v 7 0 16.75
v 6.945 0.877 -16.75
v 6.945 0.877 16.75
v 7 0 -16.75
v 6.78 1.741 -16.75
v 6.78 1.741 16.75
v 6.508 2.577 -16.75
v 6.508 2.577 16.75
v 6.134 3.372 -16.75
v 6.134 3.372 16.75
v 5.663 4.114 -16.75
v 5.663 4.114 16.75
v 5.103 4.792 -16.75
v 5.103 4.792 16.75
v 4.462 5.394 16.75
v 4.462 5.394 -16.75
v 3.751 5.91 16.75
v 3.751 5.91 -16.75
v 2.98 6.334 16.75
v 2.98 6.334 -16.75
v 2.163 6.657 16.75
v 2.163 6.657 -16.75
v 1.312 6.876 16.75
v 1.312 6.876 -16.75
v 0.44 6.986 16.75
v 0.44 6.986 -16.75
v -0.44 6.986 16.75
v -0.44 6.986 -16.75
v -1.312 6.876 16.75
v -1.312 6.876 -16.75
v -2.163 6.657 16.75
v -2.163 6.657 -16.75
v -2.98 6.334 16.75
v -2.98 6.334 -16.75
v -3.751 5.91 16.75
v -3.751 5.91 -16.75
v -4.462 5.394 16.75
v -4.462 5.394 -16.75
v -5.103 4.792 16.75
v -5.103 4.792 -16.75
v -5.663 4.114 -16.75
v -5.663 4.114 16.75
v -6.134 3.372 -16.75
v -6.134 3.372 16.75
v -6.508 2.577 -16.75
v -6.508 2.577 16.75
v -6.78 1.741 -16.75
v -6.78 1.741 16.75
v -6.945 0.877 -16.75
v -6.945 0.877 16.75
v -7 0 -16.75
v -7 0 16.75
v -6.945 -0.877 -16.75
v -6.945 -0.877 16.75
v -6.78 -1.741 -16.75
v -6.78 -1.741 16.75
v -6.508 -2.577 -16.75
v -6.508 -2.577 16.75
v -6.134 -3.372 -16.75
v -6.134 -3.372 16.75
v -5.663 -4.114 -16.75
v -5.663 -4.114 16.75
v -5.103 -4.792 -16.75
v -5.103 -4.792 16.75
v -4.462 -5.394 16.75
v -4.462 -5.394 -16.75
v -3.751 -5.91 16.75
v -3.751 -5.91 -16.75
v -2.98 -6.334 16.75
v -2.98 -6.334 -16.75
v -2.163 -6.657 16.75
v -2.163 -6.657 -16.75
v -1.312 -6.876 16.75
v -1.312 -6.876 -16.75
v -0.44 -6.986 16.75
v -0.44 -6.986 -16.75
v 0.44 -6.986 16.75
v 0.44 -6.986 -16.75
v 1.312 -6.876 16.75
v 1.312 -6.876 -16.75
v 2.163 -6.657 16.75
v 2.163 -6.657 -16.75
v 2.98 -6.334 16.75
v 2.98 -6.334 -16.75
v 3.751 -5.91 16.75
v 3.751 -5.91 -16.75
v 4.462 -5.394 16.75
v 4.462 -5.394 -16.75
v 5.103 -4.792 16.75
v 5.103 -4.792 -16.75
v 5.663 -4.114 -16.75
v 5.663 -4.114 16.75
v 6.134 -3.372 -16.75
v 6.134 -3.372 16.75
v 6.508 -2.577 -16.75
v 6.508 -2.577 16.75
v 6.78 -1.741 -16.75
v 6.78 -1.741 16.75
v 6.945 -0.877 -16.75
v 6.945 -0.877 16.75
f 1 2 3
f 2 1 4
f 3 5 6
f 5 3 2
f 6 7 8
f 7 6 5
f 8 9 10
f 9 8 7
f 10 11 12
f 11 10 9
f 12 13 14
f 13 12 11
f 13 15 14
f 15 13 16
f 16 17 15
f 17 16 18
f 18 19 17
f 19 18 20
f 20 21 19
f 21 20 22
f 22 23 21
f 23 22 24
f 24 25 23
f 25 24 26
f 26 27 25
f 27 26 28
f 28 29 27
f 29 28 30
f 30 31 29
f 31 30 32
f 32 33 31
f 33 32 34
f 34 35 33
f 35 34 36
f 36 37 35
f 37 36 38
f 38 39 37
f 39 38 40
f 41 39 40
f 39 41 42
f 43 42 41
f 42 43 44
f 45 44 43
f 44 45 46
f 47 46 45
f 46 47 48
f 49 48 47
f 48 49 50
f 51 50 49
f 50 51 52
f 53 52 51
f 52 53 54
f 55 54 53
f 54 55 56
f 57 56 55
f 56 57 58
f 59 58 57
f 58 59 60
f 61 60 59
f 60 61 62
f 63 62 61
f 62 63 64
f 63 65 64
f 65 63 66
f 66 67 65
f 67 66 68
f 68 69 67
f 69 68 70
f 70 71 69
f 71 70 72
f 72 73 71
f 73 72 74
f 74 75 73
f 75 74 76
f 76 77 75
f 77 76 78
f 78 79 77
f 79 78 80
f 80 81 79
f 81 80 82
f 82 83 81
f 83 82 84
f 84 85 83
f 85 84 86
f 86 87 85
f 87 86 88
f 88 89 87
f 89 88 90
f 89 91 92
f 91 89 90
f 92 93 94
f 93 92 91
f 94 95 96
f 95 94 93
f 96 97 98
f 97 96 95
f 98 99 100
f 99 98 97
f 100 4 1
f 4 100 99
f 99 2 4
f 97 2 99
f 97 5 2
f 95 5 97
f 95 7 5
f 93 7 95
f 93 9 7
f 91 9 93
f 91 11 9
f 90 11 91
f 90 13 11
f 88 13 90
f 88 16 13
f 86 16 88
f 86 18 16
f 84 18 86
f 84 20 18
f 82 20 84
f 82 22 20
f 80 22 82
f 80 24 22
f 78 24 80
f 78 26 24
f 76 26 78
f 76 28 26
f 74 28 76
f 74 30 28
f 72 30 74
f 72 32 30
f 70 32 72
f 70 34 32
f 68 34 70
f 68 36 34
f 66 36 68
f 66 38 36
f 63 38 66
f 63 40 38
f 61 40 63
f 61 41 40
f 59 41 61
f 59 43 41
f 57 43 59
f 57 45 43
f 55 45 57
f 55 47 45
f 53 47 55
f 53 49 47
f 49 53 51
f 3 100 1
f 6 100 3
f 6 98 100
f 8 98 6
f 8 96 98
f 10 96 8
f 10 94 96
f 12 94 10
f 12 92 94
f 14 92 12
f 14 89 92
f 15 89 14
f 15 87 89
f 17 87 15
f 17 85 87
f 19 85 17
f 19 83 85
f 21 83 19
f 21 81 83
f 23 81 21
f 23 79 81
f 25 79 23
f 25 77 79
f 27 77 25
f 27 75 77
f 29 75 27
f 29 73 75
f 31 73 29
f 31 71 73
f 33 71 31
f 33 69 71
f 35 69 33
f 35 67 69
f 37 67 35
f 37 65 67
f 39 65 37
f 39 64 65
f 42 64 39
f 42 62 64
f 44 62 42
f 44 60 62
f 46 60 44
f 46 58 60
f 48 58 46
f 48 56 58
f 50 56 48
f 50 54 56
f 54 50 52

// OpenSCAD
/********************************************************
This file is part of the RepRapPNP project, developed at the University of Hamburg.
Author: Daniel Ahlers <2ahlers@informatik.uni-hamburg.de> 
License: 'GNU Affero General Public License AGPLv3 http://www.gnu.org/licenses/agpl.html' 
*******************************************************/

// general object resolution
$fn = 50;

cylinder(33.5,r=14/2,center=true);
